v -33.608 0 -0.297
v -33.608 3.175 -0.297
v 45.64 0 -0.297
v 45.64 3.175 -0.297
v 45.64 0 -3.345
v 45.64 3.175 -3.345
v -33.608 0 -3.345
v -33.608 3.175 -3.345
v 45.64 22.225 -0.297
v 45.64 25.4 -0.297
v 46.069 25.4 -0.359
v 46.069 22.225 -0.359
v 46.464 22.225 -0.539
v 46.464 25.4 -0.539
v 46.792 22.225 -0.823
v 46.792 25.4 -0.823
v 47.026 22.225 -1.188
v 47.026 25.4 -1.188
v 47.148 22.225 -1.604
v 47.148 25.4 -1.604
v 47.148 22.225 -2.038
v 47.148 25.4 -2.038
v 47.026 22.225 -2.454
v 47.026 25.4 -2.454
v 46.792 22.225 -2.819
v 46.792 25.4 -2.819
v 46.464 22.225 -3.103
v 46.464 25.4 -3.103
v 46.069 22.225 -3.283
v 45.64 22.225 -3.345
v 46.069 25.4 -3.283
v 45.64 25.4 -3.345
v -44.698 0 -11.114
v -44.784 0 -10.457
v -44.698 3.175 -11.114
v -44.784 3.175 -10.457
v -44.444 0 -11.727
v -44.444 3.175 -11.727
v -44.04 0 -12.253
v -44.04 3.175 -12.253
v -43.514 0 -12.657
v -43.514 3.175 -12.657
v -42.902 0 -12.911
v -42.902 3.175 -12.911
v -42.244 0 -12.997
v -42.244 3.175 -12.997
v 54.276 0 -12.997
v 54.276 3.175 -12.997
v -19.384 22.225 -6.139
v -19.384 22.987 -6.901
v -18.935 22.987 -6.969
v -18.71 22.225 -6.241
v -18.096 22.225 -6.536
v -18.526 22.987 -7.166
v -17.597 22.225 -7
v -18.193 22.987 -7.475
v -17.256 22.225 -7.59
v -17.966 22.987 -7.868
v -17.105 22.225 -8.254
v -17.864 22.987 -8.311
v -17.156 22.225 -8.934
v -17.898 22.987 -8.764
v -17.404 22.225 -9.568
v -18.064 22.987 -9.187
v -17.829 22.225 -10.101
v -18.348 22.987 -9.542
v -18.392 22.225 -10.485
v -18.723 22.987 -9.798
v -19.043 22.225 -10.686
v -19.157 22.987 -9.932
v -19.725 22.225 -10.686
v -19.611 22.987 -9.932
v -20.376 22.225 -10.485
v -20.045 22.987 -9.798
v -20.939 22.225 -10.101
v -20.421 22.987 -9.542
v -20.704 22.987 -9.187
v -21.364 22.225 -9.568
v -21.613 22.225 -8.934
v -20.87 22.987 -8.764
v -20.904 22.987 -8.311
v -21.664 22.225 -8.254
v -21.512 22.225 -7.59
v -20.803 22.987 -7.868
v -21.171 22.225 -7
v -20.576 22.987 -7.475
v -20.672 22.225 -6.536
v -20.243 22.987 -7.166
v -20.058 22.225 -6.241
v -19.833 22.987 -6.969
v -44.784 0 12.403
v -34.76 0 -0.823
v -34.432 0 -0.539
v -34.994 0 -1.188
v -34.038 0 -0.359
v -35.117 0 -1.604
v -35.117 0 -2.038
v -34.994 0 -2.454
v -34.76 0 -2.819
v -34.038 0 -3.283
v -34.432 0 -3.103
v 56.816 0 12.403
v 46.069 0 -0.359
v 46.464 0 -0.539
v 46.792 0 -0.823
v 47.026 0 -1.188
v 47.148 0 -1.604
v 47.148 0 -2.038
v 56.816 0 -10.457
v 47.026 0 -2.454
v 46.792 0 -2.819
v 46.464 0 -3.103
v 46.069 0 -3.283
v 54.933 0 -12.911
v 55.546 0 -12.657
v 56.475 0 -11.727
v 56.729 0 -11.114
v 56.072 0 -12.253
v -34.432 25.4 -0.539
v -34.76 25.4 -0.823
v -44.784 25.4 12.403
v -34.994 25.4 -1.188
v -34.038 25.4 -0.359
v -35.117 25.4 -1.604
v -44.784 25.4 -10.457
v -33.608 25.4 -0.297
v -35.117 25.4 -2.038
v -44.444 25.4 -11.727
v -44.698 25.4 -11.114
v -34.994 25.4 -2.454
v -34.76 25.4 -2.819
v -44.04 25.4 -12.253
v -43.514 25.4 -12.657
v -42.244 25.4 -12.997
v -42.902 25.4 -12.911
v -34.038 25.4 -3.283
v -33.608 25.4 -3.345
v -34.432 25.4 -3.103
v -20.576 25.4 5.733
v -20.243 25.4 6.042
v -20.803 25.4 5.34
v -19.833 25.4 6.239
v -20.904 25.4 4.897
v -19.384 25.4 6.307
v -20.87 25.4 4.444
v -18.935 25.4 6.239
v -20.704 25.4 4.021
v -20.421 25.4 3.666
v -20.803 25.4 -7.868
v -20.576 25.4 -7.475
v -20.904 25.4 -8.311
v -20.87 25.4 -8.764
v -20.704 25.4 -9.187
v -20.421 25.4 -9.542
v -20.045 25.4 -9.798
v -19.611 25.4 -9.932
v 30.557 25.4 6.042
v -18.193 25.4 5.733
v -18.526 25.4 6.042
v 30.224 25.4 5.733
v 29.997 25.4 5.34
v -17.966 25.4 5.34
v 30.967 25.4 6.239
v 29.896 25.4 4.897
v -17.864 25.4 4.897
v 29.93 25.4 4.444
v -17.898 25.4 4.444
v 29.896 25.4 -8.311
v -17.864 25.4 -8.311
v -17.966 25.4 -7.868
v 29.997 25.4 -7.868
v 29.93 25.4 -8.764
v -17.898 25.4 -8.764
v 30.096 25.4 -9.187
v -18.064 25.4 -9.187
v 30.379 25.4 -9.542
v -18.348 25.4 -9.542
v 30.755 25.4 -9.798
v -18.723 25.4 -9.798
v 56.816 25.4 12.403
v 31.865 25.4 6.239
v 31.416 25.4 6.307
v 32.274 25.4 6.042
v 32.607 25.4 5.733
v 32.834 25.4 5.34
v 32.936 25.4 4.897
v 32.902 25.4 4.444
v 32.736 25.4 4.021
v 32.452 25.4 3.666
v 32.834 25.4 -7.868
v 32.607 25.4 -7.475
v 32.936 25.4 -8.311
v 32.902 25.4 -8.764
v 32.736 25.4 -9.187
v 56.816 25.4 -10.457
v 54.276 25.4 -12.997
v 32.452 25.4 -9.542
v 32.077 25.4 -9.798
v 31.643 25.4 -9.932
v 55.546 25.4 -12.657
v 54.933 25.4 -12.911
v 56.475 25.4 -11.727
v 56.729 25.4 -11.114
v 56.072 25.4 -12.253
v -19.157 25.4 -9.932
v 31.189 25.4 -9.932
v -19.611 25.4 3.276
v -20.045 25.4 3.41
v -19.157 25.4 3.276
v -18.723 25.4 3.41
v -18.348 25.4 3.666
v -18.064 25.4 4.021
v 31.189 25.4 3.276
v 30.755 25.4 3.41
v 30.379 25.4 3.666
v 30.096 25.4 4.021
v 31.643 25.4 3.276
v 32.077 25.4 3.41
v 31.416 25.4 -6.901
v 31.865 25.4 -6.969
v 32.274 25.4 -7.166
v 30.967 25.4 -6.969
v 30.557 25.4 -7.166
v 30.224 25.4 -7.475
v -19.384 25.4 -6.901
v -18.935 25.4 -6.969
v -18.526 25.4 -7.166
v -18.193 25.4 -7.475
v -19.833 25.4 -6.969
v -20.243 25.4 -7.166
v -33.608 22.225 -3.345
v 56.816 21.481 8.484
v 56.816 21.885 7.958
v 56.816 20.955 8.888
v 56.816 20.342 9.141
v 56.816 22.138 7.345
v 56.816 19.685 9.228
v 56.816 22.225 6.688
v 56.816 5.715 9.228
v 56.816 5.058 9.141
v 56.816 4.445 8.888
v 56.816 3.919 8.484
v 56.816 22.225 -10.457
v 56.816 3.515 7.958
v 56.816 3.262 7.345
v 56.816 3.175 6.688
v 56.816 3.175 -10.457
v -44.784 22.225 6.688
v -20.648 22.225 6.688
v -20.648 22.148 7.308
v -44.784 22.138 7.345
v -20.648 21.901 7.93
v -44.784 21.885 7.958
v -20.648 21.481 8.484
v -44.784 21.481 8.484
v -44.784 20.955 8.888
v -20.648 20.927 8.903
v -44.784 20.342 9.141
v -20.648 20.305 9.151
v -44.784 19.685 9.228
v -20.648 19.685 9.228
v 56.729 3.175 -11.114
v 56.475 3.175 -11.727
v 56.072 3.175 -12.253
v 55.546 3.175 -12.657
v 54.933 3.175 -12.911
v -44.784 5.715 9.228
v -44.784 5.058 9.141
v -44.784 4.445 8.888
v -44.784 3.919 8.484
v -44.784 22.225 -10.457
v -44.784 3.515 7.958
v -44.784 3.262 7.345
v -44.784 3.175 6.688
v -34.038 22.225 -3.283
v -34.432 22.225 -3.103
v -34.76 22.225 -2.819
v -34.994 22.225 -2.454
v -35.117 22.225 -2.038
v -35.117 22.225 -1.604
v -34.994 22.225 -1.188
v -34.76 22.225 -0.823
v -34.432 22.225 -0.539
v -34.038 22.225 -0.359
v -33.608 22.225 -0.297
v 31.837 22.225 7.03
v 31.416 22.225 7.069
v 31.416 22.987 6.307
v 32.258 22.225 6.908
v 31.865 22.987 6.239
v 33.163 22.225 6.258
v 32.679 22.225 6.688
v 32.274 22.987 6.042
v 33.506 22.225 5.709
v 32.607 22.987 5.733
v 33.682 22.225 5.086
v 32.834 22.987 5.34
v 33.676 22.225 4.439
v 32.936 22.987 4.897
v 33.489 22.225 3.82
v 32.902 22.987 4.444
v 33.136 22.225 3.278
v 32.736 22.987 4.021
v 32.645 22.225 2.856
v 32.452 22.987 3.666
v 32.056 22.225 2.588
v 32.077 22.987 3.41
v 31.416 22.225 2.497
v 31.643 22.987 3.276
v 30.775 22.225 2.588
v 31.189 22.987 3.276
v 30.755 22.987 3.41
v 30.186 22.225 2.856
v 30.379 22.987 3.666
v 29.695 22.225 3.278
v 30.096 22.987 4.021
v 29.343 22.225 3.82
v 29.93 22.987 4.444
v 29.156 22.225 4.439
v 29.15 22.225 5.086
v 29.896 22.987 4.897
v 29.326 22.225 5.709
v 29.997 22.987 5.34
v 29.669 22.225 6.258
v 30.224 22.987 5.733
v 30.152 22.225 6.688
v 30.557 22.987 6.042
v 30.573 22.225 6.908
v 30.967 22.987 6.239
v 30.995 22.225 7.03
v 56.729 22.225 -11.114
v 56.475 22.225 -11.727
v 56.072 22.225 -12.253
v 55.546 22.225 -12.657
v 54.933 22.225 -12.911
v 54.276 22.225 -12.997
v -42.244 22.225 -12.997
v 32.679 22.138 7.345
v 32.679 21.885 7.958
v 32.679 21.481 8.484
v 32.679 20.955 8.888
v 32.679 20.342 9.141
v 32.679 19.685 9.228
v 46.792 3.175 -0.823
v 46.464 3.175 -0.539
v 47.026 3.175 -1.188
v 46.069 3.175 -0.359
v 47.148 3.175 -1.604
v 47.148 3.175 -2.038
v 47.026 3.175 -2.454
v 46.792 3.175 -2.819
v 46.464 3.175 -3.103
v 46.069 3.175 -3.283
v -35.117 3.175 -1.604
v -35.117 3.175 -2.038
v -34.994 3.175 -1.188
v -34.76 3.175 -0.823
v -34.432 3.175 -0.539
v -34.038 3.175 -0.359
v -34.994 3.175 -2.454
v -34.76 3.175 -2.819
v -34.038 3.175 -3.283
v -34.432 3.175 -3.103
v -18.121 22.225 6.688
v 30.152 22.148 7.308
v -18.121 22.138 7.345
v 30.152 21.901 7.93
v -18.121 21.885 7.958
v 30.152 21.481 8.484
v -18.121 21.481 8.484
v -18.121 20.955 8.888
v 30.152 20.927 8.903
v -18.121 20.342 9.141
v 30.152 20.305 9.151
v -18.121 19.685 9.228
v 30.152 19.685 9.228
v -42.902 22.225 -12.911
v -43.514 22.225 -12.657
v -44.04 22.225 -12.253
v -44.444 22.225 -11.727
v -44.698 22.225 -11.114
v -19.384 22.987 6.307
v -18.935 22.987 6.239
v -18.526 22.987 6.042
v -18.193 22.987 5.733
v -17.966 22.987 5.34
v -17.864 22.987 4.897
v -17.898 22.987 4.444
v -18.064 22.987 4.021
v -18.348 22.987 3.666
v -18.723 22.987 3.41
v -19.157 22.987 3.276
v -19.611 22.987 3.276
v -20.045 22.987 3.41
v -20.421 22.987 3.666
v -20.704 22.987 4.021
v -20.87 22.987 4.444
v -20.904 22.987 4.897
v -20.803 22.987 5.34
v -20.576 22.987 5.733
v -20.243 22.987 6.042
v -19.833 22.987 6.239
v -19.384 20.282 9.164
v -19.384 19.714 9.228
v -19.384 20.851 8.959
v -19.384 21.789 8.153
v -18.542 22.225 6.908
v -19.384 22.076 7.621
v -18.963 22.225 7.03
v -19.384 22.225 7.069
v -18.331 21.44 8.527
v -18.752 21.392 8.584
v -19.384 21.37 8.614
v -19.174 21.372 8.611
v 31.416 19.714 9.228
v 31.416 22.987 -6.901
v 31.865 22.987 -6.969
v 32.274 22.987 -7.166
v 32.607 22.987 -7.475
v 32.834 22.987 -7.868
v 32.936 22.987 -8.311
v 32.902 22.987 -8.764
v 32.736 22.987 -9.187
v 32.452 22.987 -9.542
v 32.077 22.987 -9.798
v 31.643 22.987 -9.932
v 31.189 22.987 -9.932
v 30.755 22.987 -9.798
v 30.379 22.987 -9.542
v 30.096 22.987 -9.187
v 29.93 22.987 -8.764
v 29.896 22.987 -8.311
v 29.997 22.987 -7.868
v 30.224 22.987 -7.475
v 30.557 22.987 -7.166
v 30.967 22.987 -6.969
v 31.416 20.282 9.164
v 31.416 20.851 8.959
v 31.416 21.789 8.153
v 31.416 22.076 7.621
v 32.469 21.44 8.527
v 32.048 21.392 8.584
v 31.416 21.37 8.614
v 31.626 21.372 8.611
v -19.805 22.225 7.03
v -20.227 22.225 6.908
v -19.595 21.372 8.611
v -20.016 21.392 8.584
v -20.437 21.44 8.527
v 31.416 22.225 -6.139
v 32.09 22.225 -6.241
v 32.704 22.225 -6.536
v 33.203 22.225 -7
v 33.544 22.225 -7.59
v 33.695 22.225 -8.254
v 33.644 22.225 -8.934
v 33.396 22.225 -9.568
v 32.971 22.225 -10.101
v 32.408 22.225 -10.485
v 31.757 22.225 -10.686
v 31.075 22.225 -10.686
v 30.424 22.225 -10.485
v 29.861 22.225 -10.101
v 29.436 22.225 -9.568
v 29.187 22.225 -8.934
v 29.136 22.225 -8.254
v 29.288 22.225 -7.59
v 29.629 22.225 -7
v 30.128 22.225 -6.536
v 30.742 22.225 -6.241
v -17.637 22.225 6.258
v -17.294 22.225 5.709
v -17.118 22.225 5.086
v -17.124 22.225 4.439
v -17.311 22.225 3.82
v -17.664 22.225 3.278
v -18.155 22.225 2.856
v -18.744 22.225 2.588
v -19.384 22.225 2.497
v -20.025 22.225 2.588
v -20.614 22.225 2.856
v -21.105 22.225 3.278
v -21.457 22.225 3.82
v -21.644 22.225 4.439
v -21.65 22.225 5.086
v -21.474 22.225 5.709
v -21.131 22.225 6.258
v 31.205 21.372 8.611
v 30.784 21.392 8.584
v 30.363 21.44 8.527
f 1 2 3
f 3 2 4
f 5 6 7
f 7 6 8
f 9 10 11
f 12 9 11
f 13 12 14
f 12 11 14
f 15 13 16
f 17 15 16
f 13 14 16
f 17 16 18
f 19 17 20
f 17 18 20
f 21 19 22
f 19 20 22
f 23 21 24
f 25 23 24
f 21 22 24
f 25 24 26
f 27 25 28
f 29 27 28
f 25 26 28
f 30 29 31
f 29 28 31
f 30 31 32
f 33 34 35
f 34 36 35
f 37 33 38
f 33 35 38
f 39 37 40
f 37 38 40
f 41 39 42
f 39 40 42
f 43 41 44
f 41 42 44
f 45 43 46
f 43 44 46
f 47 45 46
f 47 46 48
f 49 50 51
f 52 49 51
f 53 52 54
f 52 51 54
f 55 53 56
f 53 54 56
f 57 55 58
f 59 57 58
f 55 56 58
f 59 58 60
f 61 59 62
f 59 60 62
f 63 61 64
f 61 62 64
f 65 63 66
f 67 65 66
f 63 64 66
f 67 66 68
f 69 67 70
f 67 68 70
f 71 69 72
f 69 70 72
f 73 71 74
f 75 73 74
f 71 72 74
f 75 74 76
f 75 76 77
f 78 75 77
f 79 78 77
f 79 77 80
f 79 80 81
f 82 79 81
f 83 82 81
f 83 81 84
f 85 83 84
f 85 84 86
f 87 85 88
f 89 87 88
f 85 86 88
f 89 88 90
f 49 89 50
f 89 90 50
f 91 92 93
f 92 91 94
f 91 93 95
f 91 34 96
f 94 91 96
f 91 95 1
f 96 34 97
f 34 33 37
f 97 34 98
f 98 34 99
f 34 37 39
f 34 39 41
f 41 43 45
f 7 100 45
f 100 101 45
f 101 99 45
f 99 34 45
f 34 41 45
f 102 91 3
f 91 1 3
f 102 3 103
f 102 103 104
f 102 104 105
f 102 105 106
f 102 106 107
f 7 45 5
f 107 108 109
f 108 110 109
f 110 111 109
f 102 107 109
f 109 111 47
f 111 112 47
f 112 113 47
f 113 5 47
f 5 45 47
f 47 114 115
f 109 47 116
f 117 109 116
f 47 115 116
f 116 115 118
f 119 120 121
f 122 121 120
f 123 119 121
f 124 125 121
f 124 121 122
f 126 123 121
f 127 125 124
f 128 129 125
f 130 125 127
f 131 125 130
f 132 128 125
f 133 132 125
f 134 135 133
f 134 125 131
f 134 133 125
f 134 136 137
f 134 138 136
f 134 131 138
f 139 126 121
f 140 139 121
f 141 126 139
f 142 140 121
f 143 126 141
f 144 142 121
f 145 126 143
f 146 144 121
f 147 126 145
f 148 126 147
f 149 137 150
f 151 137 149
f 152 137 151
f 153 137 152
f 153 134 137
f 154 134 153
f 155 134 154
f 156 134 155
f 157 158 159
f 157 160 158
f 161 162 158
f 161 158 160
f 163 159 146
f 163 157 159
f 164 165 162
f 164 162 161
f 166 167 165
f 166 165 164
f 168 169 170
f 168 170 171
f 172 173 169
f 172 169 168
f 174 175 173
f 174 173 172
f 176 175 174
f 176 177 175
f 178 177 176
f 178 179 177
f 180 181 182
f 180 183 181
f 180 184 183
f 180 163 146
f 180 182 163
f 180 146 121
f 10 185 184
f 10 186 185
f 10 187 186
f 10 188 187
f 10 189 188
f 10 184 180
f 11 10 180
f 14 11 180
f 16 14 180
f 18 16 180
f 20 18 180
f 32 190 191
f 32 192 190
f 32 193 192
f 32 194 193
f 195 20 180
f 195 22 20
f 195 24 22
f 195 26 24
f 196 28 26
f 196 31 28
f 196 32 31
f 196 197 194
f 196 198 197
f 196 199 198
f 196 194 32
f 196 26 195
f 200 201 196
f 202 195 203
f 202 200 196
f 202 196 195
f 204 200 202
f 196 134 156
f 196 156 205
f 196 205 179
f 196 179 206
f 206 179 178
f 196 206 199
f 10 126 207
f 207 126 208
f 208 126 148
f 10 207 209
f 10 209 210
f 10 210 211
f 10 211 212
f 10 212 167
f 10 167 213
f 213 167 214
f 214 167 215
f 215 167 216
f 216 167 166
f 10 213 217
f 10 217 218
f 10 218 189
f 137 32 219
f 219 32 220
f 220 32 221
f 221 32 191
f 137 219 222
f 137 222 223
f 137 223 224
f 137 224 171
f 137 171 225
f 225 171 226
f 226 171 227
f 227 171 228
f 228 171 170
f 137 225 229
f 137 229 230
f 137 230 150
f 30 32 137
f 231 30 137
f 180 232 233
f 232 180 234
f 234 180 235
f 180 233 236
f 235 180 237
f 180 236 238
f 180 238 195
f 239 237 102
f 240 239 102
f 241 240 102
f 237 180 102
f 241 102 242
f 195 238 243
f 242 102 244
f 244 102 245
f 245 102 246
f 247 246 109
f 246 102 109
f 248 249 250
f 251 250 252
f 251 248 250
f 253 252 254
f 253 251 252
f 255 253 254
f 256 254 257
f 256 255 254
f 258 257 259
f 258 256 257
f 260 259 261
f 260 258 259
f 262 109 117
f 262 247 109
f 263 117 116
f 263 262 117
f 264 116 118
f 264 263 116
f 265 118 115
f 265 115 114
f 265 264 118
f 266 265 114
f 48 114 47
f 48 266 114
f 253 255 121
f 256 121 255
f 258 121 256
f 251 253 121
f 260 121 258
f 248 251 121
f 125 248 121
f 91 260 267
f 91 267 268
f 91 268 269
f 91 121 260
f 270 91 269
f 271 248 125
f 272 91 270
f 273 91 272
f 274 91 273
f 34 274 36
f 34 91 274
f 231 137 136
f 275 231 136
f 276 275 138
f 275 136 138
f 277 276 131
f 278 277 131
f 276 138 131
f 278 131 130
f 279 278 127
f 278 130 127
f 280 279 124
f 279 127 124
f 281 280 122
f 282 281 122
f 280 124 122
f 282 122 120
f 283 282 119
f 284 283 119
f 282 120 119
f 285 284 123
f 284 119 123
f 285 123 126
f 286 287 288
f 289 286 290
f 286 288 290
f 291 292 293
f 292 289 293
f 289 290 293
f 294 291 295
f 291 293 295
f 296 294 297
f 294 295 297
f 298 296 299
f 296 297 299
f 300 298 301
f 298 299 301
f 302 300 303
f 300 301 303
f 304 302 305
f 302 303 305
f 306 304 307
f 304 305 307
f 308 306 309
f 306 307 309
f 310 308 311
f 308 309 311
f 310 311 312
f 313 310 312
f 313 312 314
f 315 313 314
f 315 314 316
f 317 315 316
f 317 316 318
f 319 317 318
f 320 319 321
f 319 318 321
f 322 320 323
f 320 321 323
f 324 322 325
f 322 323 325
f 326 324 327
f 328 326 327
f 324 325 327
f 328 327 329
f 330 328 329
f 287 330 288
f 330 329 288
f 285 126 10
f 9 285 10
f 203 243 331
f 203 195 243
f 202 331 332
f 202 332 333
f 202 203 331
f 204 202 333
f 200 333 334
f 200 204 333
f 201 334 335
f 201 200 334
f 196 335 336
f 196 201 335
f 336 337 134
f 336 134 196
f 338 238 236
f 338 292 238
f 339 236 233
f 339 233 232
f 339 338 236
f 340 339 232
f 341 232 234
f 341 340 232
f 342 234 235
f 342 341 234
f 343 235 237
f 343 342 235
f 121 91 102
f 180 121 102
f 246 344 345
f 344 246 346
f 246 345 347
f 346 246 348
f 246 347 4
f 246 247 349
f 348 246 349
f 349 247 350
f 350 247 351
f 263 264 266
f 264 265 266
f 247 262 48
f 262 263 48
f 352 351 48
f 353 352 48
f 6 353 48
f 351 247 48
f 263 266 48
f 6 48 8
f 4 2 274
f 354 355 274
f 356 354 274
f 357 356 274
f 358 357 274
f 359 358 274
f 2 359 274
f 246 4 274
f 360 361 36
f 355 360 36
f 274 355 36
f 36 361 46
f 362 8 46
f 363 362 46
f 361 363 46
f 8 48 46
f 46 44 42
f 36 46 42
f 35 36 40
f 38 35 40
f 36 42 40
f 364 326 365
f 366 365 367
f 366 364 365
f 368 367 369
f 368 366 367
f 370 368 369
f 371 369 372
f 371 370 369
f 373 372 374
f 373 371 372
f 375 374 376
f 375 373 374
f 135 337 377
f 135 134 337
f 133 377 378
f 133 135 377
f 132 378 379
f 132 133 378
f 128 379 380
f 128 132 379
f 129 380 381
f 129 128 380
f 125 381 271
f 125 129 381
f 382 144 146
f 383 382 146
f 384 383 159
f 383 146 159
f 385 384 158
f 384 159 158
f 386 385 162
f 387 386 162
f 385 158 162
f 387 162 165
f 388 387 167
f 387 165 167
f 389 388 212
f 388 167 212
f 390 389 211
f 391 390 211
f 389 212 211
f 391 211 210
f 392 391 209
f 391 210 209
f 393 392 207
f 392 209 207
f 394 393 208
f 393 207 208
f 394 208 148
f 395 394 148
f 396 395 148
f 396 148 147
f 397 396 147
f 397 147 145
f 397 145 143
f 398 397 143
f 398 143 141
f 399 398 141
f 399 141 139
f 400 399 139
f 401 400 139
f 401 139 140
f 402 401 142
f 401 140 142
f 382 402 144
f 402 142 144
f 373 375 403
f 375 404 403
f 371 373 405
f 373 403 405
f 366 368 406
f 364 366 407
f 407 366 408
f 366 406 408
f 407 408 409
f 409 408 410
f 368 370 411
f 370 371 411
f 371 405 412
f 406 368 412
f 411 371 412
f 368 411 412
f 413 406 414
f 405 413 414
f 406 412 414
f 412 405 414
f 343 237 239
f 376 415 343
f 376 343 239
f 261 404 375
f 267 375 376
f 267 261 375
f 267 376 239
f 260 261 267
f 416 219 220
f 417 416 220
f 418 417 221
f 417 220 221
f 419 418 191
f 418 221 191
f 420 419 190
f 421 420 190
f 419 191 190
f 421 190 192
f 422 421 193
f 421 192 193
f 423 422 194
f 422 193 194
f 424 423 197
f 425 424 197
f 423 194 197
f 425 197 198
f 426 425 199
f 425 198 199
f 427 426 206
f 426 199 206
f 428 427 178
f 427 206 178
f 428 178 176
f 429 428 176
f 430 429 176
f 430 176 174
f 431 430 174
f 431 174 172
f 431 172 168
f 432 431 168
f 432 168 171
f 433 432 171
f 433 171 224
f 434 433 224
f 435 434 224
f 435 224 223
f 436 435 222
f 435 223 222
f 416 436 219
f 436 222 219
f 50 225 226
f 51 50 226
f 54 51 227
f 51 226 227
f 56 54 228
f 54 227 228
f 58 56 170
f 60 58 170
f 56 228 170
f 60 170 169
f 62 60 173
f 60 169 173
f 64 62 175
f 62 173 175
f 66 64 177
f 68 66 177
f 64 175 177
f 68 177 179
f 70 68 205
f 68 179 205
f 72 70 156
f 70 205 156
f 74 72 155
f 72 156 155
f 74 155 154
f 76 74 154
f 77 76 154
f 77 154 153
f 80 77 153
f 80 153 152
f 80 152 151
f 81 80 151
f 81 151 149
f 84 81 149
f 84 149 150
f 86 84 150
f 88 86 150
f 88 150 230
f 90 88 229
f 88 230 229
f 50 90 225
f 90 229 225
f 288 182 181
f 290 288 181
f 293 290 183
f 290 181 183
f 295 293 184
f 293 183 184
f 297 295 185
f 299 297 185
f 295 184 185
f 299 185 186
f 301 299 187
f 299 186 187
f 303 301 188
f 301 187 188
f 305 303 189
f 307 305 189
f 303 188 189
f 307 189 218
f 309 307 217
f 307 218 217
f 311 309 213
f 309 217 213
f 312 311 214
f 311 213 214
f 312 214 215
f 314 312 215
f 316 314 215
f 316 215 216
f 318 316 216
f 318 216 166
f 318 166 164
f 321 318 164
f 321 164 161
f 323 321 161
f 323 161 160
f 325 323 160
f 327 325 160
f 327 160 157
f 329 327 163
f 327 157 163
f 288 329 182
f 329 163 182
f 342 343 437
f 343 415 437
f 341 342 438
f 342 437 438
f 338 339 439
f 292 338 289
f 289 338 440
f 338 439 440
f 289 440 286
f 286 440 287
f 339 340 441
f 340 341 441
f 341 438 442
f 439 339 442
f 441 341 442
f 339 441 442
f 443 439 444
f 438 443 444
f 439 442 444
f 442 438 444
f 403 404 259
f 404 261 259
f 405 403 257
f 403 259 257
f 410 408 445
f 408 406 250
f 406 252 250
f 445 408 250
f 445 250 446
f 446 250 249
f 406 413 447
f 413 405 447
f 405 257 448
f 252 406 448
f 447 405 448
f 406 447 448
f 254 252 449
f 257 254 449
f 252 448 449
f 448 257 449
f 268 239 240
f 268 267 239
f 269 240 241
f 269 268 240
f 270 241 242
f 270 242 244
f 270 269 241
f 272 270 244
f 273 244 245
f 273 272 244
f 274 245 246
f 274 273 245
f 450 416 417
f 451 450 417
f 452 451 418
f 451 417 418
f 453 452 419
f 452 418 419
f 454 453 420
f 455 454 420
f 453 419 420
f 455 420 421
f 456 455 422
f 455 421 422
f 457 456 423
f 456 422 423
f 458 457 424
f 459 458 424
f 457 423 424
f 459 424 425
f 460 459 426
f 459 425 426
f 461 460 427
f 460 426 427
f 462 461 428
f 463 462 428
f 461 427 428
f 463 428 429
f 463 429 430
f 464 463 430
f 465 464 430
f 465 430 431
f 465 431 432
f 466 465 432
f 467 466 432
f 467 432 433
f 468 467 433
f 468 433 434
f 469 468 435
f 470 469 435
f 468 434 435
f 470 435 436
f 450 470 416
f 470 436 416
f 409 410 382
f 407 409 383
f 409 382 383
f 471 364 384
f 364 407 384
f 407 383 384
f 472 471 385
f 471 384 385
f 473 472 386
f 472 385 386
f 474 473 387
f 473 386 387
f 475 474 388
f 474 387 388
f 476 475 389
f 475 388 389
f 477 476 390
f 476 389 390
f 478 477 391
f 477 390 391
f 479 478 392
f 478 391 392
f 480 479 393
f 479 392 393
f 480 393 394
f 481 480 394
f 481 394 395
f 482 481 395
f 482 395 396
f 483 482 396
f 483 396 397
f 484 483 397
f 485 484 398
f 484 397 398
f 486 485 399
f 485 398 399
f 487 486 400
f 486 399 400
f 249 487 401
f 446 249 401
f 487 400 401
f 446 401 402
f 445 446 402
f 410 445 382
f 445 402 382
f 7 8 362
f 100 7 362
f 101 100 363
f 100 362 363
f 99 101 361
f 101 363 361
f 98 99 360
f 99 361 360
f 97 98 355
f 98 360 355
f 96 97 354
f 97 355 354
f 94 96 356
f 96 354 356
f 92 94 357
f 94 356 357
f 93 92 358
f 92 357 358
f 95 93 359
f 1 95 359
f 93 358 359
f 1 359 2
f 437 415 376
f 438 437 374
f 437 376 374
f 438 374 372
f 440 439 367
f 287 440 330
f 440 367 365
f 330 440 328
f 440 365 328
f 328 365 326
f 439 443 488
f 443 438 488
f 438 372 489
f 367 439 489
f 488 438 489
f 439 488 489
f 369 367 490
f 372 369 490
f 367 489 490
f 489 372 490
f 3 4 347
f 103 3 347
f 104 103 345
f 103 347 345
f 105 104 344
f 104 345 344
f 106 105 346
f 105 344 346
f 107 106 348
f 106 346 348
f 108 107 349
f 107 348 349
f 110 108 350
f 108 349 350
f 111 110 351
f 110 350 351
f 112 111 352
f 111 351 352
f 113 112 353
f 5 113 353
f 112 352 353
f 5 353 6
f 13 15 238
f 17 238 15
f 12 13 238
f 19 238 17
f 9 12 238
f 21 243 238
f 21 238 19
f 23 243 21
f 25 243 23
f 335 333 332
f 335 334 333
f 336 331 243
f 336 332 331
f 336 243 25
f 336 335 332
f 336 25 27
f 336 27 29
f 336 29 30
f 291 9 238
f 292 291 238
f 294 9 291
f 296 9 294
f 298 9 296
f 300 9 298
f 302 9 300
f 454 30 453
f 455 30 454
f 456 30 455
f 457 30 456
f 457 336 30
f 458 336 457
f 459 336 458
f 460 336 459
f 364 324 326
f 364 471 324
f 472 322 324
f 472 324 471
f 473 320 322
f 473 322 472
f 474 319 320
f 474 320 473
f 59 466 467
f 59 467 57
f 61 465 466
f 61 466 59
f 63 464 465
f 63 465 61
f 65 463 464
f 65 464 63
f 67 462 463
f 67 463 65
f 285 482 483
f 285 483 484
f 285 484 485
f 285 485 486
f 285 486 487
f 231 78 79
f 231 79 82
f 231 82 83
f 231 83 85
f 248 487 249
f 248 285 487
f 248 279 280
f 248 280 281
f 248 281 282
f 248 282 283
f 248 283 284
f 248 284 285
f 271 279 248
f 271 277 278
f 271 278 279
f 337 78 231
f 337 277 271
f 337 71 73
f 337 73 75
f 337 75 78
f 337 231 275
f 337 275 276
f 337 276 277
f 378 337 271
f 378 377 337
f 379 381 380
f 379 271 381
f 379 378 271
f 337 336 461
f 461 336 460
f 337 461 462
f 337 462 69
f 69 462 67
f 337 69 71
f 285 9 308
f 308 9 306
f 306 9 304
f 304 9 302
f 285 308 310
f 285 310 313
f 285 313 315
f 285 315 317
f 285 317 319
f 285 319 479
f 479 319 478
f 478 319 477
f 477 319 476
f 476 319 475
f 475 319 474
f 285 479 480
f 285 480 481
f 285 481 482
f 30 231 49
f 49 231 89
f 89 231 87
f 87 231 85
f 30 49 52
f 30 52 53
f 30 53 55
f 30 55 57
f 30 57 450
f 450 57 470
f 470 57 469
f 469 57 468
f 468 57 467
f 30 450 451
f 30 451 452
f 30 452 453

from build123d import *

# Parameters (mm, degrees)
SKETCH1_W           = 101.6
SKETCH1_H           = 25.4
BOSS_EXTRUDE1_DEPTH = 25.4
SKETCH2_W           = 101.6
SKETCH2_H           = 19.05
CUT_EXTRUDE1_DEPTH  = 22.225
CUT_EXTRUDE2_DEPTH  = 25.4
SKETCH5_R           = 1.524
CUT_EXTRUDE4_DEPTH  = 3.175
CHAMFER1_SIZE       = 0.762
FILLET1_R           = 2.54
FILLET2_R           = 2.54


with BuildPart() as part:
    # Sketch1 → Boss-Extrude1 (new body)
    with BuildSketch(Plane(origin=(0, 0, 0), x_dir=(1, 0, 0), z_dir=(0, 1, 0))):
        with Locations((6.015789474, 0.297076023)):
            Rectangle(SKETCH1_W, SKETCH1_H)
    extrude(amount=BOSS_EXTRUDE1_DEPTH)

    # Sketch2 → Cut-Extrude1 (cut)
    with BuildSketch(Plane(origin=(0, 0, -12.997076023), x_dir=(-1, 0, 0), z_dir=(0, 0, -1))):
        with Locations((-6.015789474, 12.7)):
            Rectangle(SKETCH2_W, SKETCH2_H)
    extrude(amount=-CUT_EXTRUDE1_DEPTH, mode=Mode.SUBTRACT)

    # Sketch4 → Cut-Extrude2 (cut)
    with BuildSketch(Plane(origin=(0, 25.4, 0), x_dir=(1, 0, 0), z_dir=(0, 1, 0))):
        with BuildLine():
            Line((-33.608210526, 0.297076023), (45.639789474, 0.297076023))
            ThreePointArc((45.639789474, 0.297076023), (47.163789474, 1.821076023), (45.639789474, 3.345076023))
            Line((45.639789474, 3.345076023), (-33.608210526, 3.345076023))
            ThreePointArc((-33.608210526, 3.345076023), (-35.132210526, 1.821076023), (-33.608210526, 0.297076023))
        make_face()
    extrude(amount=-CUT_EXTRUDE2_DEPTH, mode=Mode.SUBTRACT)

    # Sketch5 → Cut-Extrude4 (cut)
    with BuildSketch(Plane(origin=(0, 25.4, 0), x_dir=(1, 0, 0), z_dir=(0, 1, 0))):
        with Locations(Location((-19.384210526, 8.425076023, 0), (0, 0, 270))):
            Circle(SKETCH5_R)
        with Locations(Location((-19.384210526, -4.782923977, 0), (0, 0, 270))):
            Circle(SKETCH5_R)
        with Locations(Location((31.415789474, 8.425076023, 0), (0, 0, 270))):
            Circle(SKETCH5_R)
        with Locations(Location((31.415789474, -4.782923977, 0), (0, 0, 270))):
            Circle(SKETCH5_R)
    extrude(amount=-CUT_EXTRUDE4_DEPTH, mode=Mode.SUBTRACT)

    # Chamfer1
    chamfer1_edges = [part.edges().sort_by_distance(p)[0] for p in [
        (-19.384210526, 22.225, -9.949076023),
        (-19.384210526, 22.225, 3.258923977),
        (31.415789474, 22.225, -9.949076023),
        (31.415789474, 22.225, 3.258923977),
    ]]
    chamfer(chamfer1_edges, length=CHAMFER1_SIZE)

    # Fillet1
    fillet1_edges = [part.edges().sort_by_distance(p)[0] for p in [
        (6.015789474, 22.225, 9.227923977),
        (6.015789474, 3.175, 9.227923977),
    ]]
    fillet(fillet1_edges, radius=FILLET1_R)

    # Fillet2
    fillet2_edges = [part.edges().sort_by_distance(p)[0] for p in [
        (-44.784210526, 1.5875, -12.997076023),
        (56.815789474, 1.5875, -12.997076023),
        (-44.784210526, 23.8125, -12.997076023),
        (56.815789474, 23.8125, -12.997076023),
    ]]
    fillet(fillet2_edges, radius=FILLET2_R)


solid = part.part
